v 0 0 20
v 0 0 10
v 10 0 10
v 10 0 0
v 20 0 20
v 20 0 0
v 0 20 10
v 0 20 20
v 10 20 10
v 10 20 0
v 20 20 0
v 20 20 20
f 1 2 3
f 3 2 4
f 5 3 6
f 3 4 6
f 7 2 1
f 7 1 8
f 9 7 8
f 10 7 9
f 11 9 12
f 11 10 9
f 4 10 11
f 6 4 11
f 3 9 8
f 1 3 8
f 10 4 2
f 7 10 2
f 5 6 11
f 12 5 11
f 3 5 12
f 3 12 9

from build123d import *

# Parameters (mm, degrees)
SKETCH1_W           = 20
SKETCH1_H           = 20
BOSS_EXTRUDE1_DEPTH = 20
CUT_EXTRUDE1_DEPTH  = 20
CUT_EXTRUDE2_DEPTH  = 20


with BuildPart() as part:
    # Sketch1 → Boss-Extrude1 (new body)
    with BuildSketch(Plane.XY):
        with Locations((10, 10)):
            Rectangle(SKETCH1_W, SKETCH1_H)
    extrude(amount=BOSS_EXTRUDE1_DEPTH)

    # Sketch2 → Cut-Extrude1 (cut)
    with BuildSketch(Plane(origin=(0, 20, 0), x_dir=(1, 0, 0), z_dir=(0, 1, 0))):
        Polygon((0, 0), (10, 0), (0, -10), align=None)
    extrude(amount=-CUT_EXTRUDE1_DEPTH, mode=Mode.SUBTRACT)

    # Sketch3 → Cut-Extrude2 (cut)
    with BuildSketch(Plane(origin=(0, 20, 0), x_dir=(1, 0, 0), z_dir=(0, 1, 0))):
        Polygon((20, -20), (10, -10), (0, -20), align=None)
    extrude(amount=-CUT_EXTRUDE2_DEPTH, mode=Mode.SUBTRACT)


solid = part.part
